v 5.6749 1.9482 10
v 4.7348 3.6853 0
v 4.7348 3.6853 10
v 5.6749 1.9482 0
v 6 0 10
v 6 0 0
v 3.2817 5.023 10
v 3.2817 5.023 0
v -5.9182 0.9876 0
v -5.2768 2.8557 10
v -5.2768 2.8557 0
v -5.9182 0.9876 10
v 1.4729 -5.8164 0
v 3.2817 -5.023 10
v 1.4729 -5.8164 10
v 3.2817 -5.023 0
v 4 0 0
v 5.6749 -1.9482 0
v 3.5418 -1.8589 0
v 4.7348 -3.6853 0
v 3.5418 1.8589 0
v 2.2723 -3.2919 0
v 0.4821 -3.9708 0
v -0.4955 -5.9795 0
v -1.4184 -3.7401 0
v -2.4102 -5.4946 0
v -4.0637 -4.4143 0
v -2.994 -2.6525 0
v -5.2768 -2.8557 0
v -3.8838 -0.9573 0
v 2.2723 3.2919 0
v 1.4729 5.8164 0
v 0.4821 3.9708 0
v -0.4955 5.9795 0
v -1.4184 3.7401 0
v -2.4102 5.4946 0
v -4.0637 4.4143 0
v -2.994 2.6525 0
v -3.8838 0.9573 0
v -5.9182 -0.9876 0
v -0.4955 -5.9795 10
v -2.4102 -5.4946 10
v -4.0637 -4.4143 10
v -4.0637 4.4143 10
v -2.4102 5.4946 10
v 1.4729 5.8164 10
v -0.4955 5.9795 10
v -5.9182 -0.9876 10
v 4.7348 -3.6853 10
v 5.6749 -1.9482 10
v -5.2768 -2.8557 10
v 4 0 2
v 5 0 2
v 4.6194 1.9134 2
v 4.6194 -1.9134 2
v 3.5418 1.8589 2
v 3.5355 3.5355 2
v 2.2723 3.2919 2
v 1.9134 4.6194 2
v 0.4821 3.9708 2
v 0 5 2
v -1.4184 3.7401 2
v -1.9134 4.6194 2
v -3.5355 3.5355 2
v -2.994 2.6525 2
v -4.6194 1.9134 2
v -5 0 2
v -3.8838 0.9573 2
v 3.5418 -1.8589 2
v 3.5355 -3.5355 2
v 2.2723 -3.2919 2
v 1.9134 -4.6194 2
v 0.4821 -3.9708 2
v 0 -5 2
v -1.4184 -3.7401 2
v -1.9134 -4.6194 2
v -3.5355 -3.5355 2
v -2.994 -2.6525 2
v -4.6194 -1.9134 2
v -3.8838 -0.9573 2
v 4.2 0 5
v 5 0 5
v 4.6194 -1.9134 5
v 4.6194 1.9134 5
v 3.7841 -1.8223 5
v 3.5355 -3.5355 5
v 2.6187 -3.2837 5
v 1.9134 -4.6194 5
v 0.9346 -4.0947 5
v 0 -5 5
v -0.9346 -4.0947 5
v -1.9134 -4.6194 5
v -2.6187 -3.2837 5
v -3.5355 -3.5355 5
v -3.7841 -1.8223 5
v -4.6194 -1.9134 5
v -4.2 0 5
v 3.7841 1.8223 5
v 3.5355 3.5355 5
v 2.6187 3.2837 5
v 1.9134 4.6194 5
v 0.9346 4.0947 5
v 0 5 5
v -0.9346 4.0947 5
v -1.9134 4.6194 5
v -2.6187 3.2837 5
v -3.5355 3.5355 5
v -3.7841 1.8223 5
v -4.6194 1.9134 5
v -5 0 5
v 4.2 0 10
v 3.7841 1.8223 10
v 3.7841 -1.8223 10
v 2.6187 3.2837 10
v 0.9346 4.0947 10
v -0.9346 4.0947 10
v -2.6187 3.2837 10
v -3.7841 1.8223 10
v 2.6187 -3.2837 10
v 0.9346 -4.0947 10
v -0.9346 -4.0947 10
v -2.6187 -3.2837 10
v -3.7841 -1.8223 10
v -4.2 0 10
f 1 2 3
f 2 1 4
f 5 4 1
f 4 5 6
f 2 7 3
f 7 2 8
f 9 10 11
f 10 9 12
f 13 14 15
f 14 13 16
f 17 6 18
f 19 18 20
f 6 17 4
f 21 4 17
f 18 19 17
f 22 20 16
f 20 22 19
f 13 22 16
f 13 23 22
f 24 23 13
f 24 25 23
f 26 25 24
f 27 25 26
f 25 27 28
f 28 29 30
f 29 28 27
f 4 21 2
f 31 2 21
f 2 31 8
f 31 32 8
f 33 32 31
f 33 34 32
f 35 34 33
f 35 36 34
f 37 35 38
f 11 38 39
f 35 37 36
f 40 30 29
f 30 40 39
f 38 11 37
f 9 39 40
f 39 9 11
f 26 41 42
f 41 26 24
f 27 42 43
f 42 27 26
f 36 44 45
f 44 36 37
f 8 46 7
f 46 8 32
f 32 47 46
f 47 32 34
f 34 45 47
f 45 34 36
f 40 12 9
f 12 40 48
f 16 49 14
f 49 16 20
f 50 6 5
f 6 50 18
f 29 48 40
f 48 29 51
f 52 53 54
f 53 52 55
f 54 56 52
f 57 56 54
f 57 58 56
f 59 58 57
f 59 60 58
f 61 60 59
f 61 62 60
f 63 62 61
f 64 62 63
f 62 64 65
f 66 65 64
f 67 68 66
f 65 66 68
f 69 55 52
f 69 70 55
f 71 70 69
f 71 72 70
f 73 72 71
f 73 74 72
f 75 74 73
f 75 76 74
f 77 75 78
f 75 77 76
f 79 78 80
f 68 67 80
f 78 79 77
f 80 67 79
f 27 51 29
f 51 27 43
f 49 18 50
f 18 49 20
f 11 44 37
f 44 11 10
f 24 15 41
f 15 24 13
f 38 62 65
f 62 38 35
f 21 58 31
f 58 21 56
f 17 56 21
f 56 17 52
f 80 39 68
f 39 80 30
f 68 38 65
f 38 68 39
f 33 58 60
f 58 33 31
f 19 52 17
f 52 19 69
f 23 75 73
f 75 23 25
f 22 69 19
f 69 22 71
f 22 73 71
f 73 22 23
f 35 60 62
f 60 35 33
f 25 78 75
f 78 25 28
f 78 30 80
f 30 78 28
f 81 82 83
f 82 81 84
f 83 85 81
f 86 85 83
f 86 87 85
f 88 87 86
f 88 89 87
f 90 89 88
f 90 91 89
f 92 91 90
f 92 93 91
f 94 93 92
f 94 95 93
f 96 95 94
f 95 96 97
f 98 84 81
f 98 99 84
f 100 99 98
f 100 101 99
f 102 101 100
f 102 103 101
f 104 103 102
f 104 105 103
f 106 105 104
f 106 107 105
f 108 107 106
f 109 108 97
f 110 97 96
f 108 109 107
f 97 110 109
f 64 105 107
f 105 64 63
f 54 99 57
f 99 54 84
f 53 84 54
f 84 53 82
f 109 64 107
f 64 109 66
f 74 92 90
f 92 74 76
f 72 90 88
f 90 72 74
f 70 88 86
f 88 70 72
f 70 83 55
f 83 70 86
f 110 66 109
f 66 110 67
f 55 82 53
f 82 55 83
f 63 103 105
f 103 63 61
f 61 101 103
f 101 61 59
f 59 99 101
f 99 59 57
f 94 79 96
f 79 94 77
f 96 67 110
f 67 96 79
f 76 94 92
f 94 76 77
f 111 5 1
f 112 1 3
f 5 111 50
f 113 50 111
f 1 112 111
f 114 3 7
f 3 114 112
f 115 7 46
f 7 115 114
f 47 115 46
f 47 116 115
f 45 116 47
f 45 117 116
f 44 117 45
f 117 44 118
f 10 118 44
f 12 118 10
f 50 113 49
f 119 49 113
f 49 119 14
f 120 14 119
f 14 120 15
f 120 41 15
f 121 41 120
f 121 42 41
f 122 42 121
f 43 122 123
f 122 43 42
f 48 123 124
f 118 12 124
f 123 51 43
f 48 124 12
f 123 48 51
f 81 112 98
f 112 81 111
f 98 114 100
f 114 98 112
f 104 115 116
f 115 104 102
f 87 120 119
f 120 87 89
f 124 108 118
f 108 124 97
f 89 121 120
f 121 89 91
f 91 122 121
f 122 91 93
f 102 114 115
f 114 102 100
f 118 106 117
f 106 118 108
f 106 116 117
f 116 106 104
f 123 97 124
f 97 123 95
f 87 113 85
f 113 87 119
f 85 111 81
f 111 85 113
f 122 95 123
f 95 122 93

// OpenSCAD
difference(){
   translate([0,0,0]) cylinder(r=6,h=2);
   translate([0,0,-0]) cylinder(r=4,h=2.2);
   }
difference(){
   translate([0,0,2]) cylinder(r=6,h=3);
   translate([0,0,2]) cylinder(r=5,h=3);
   }
difference(){
   translate([0,0,5]) cylinder(r=6,h=5);
   translate([0,0,5]) cylinder(r=4.2,h=5);
   }
